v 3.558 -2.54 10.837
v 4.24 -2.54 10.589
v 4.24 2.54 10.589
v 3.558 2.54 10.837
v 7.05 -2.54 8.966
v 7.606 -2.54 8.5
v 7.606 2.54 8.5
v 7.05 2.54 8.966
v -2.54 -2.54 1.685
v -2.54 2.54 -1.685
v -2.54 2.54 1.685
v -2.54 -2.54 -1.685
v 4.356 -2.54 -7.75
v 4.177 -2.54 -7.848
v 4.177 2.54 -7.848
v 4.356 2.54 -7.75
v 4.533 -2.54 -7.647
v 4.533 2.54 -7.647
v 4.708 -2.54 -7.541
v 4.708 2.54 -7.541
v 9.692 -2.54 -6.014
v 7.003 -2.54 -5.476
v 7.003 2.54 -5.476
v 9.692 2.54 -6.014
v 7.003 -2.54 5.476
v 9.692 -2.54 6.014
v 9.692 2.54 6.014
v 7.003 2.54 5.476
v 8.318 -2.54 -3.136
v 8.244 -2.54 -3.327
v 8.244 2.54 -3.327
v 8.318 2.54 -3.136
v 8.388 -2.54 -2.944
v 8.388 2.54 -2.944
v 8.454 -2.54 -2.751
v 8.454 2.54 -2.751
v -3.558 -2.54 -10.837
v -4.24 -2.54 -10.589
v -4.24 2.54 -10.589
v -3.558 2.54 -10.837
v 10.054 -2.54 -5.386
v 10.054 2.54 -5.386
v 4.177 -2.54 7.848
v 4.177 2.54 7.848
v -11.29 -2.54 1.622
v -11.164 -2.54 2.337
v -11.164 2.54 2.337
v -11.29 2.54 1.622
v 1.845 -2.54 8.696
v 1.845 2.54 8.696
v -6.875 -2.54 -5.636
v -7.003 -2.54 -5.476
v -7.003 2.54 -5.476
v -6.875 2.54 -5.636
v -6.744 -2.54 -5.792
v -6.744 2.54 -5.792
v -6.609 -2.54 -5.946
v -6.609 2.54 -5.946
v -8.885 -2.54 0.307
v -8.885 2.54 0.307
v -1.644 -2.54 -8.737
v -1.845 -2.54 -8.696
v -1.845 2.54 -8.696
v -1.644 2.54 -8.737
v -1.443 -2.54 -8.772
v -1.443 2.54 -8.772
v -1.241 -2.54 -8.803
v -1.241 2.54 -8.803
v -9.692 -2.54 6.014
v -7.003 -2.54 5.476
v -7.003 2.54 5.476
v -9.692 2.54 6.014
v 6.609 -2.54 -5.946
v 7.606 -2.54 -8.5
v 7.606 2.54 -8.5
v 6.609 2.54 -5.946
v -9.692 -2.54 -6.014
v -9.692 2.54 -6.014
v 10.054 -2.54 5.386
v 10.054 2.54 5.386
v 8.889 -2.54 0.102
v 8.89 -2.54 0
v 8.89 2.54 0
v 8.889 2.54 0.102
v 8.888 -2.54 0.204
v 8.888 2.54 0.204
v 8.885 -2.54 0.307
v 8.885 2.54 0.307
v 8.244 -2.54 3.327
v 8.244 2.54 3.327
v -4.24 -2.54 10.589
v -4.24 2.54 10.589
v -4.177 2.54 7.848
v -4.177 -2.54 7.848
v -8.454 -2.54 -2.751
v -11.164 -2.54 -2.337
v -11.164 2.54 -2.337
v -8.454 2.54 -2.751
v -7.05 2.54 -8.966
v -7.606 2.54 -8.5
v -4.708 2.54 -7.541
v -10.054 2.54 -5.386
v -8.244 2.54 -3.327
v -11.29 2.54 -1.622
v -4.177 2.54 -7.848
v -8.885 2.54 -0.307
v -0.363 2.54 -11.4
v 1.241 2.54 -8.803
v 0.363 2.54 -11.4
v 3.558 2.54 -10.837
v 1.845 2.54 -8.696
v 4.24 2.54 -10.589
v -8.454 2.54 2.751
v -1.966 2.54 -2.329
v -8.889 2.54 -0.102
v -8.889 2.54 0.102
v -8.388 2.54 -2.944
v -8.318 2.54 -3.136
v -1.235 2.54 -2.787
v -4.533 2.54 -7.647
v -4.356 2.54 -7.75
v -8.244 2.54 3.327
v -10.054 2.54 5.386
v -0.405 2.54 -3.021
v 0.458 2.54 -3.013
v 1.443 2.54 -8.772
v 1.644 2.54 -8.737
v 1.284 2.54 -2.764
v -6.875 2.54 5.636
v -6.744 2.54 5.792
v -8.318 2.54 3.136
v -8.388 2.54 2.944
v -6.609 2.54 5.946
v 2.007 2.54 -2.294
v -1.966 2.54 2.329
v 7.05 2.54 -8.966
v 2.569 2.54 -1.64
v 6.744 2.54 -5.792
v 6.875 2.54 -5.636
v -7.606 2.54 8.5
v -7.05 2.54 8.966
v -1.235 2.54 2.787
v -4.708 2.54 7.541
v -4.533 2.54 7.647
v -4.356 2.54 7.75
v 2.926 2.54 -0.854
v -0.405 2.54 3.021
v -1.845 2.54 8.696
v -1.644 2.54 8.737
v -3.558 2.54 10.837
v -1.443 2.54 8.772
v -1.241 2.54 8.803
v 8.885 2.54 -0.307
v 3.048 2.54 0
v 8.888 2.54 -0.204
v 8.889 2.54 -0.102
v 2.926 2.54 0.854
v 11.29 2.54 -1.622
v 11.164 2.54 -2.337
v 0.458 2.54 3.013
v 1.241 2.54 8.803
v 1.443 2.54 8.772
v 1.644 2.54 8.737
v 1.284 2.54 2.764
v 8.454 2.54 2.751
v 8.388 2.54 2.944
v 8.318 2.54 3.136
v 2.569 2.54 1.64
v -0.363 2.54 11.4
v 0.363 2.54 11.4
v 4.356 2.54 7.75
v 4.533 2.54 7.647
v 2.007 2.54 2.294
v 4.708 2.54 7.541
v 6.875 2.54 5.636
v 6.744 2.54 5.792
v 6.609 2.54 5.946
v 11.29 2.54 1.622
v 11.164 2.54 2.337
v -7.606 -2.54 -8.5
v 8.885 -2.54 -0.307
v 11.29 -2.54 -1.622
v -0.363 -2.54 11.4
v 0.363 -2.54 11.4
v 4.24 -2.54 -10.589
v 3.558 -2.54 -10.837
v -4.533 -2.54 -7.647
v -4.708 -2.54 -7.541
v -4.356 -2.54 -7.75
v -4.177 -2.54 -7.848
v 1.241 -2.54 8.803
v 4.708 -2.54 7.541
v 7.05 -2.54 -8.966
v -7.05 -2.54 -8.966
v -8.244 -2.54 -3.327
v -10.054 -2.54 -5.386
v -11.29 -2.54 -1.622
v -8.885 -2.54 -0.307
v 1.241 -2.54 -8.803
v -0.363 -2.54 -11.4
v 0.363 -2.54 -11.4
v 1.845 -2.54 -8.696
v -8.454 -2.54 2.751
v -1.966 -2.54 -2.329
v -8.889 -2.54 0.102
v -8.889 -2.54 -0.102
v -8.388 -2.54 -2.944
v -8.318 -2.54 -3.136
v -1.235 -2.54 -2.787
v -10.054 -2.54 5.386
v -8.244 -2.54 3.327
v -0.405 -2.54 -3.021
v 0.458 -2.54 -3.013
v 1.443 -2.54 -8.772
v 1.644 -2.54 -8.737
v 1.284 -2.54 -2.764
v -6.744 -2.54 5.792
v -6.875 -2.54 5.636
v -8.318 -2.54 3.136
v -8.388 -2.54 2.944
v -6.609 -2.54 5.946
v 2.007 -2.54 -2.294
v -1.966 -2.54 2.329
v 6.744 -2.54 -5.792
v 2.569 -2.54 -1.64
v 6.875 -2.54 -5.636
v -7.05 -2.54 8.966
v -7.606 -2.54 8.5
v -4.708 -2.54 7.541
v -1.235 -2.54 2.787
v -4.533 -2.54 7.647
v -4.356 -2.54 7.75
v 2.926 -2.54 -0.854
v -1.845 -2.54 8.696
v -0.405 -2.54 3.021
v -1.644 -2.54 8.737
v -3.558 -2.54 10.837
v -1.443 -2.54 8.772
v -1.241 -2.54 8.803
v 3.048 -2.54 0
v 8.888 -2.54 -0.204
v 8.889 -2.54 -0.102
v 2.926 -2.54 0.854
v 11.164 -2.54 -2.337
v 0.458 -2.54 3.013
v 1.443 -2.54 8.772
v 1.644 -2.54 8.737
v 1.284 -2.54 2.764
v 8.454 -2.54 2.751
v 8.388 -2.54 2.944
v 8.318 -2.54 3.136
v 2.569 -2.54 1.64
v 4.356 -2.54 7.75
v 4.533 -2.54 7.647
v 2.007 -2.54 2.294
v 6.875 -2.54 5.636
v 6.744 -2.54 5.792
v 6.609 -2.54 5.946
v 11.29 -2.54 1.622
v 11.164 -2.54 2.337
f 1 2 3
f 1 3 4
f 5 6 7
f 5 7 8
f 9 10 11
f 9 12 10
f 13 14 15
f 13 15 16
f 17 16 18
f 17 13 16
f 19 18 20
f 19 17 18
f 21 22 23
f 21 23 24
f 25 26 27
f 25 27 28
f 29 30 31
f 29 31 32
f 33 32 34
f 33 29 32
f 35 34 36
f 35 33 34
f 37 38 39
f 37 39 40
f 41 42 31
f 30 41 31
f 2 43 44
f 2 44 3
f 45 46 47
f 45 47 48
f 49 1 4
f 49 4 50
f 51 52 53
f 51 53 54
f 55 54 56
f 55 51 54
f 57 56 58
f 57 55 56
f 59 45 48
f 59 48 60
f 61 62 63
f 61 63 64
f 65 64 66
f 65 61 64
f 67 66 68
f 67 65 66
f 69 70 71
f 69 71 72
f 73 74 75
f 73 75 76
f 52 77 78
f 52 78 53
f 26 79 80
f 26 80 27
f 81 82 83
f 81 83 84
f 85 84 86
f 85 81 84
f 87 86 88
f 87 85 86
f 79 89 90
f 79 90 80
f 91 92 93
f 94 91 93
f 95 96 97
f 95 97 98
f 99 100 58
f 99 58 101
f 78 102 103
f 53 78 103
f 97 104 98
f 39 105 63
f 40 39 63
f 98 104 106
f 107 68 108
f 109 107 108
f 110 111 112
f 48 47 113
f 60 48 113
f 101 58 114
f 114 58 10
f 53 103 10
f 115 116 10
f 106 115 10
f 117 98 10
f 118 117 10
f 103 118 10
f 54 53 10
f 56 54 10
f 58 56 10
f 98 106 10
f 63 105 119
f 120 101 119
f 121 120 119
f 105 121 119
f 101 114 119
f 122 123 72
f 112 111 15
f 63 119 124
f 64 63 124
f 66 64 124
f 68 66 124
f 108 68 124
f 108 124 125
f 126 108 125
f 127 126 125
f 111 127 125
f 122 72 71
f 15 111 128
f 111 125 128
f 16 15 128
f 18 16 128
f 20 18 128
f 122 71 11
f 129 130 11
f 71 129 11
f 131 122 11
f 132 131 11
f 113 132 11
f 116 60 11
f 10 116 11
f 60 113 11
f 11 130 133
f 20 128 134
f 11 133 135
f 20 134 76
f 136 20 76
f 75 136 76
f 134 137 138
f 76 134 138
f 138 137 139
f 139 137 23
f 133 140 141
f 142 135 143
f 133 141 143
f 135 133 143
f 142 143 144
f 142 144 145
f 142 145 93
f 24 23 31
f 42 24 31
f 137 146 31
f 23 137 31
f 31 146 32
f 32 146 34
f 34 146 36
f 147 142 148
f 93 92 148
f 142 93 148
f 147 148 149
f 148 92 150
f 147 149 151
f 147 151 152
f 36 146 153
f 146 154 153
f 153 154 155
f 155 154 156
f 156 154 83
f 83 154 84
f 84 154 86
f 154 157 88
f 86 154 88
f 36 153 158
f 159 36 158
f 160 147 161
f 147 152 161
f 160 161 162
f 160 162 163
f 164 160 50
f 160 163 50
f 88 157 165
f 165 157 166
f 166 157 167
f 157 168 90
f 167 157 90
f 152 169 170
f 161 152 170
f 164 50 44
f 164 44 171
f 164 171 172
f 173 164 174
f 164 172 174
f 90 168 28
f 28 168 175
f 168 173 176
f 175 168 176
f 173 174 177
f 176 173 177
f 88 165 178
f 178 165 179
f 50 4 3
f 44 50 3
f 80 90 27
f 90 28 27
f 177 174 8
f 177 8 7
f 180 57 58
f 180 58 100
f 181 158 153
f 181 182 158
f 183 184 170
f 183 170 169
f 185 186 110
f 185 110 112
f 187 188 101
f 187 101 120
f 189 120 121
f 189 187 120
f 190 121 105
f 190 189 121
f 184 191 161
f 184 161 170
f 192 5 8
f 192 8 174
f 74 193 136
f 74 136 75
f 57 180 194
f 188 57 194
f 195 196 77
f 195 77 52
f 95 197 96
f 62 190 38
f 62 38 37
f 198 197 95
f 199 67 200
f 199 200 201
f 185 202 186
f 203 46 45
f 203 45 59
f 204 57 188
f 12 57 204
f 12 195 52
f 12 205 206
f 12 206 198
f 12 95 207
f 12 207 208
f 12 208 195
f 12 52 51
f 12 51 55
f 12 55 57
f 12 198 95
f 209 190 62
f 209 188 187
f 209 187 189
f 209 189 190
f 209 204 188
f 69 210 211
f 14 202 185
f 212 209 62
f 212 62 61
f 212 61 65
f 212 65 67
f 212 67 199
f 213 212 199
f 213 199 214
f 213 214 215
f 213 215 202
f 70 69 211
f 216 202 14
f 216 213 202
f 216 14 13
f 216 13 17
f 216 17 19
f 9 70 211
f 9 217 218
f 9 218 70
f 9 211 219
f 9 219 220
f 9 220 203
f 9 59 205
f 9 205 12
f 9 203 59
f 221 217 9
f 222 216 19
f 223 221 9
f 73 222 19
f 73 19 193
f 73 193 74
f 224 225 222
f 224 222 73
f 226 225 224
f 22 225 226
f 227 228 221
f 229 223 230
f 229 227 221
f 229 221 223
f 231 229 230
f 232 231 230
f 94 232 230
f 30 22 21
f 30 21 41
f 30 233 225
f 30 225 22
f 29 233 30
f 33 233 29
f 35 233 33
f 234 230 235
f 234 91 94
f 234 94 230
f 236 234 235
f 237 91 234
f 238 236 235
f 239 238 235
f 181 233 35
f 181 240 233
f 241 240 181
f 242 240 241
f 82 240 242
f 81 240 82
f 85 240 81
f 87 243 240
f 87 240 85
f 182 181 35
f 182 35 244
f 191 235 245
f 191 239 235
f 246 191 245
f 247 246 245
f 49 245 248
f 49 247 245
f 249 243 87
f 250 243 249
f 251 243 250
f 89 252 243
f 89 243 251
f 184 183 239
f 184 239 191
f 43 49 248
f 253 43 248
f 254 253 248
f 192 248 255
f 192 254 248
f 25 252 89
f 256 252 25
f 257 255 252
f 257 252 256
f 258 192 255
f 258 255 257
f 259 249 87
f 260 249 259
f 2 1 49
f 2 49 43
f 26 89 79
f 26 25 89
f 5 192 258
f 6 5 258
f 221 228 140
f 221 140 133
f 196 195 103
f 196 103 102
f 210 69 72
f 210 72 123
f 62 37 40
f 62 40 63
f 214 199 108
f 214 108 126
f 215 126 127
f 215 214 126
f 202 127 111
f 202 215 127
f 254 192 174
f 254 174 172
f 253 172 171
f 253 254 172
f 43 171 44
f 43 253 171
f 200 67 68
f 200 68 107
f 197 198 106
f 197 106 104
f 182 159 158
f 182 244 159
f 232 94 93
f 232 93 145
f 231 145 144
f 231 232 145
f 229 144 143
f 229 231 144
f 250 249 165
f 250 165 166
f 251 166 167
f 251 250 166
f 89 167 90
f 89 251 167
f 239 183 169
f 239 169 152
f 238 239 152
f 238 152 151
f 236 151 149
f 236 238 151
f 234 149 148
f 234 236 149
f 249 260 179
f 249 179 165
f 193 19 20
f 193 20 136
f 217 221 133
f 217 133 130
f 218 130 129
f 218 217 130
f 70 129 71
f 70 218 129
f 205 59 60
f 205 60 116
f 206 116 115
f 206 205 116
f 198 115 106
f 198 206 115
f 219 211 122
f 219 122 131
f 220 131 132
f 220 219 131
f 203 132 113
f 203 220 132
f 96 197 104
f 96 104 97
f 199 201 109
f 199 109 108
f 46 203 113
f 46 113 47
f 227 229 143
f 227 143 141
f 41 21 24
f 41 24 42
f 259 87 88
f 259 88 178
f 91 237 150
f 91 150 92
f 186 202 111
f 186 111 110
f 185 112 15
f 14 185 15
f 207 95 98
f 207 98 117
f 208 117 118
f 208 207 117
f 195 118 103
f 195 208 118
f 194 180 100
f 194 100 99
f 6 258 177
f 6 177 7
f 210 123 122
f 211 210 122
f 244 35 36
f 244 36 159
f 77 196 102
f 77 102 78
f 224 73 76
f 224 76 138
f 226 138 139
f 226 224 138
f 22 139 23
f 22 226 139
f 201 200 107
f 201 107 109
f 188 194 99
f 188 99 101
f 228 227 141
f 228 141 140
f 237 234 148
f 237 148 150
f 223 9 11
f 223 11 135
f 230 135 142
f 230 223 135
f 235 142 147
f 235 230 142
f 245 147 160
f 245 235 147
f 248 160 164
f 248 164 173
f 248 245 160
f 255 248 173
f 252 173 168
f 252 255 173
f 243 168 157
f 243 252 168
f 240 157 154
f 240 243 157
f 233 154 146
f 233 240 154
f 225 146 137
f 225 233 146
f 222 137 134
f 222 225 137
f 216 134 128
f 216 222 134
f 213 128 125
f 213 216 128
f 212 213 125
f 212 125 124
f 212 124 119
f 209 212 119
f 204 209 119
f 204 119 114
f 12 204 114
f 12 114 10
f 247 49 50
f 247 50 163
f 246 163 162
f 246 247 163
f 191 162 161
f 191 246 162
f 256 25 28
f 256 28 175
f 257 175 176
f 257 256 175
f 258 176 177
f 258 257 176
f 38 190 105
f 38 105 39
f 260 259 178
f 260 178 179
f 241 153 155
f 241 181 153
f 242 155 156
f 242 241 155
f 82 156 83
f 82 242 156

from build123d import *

# Parameters (mm, degrees)
F1_DEPTH = 2.54


with BuildPart() as f1:
    # F0 (on Front) → F1 (new body, symmetric)
    with BuildSketch(Plane.XZ):
        with BuildLine():
            ThreePointArc((8.884708, -0.306712), (8.888677, -0.153379), (8.89, 0))
            ThreePointArc((8.89, 0), (8.888677, 0.153379), (8.884708, 0.306712))
            ThreePointArc((8.884708, 0.306712), (8.754941, 1.543732), (8.453796, 2.750534))
            ThreePointArc((8.453796, 2.750534), (8.353867, 3.040559), (8.243992, 3.326964))
            ThreePointArc((8.243992, 3.326964), (7.698966, 4.445), (7.003232, 5.476025))
            ThreePointArc((7.003232, 5.476025), (6.810135, 5.714382), (6.60893, 5.945935))
            ThreePointArc((6.60893, 5.945935), (5.714382, 6.810135), (4.707974, 7.541026))
            ThreePointArc((4.707974, 7.541026), (4.445, 7.698966), (4.176733, 7.847739))
            ThreePointArc((4.176733, 7.847739), (3.040559, 8.353867), (1.844866, 8.696469))
            ThreePointArc((1.844866, 8.696469), (1.543732, 8.754941), (1.240761, 8.802989))
            ThreePointArc((1.240761, 8.802989), (0, 8.89), (-1.240761, 8.802989))
            ThreePointArc((-1.240761, 8.802989), (-1.543732, 8.754941), (-1.844866, 8.696469))
            ThreePointArc((-1.844866, 8.696469), (-3.040559, 8.353867), (-4.176733, 7.847739))
            ThreePointArc((-4.176733, 7.847739), (-4.445, 7.698966), (-4.707974, 7.541026))
            ThreePointArc((-4.707974, 7.541026), (-5.714382, 6.810135), (-6.60893, 5.945935))
            ThreePointArc((-6.60893, 5.945935), (-6.810135, 5.714382), (-7.003232, 5.476025))
            ThreePointArc((-7.003232, 5.476025), (-7.698966, 4.445), (-8.243992, 3.326964))
            ThreePointArc((-8.243992, 3.326964), (-8.353867, 3.040559), (-8.453796, 2.750534))
            ThreePointArc((-8.453796, 2.750534), (-8.754941, 1.543732), (-8.884708, 0.306712))
            ThreePointArc((-8.884708, 0.306712), (-8.89, 0), (-8.884708, -0.306712))
            ThreePointArc((-8.884708, -0.306712), (-8.754941, -1.543732), (-8.453796, -2.750534))
            ThreePointArc((-8.453796, -2.750534), (-8.353867, -3.040559), (-8.243992, -3.326964))
            ThreePointArc((-8.243992, -3.326964), (-7.698966, -4.445), (-7.003232, -5.476025))
            ThreePointArc((-7.003232, -5.476025), (-6.810135, -5.714382), (-6.60893, -5.945935))
            ThreePointArc((-6.60893, -5.945935), (-5.714382, -6.810135), (-4.707974, -7.541026))
            ThreePointArc((-4.707974, -7.541026), (-4.445, -7.698966), (-4.176733, -7.847739))
            ThreePointArc((-4.176733, -7.847739), (-3.040559, -8.353867), (-1.844866, -8.696469))
            ThreePointArc((-1.844866, -8.696469), (-1.543732, -8.754941), (-1.240761, -8.802989))
            ThreePointArc((-1.240761, -8.802989), (0, -8.89), (1.240761, -8.802989))
            ThreePointArc((1.240761, -8.802989), (1.543732, -8.754941), (1.844866, -8.696469))
            ThreePointArc((1.844866, -8.696469), (3.040559, -8.353867), (4.176733, -7.847739))
            ThreePointArc((4.176733, -7.847739), (4.445, -7.698966), (4.707974, -7.541026))
            ThreePointArc((4.707974, -7.541026), (5.714382, -6.810135), (6.60893, -5.945935))
            ThreePointArc((6.60893, -5.945935), (6.810135, -5.714382), (7.003232, -5.476025))
            ThreePointArc((7.003232, -5.476025), (7.698966, -4.445), (8.243992, -3.326964))
            ThreePointArc((8.243992, -3.326964), (8.353867, -3.040559), (8.453796, -2.750534))
            ThreePointArc((8.453796, -2.750534), (8.754941, -1.543732), (8.884708, -0.306712))
        make_face()
        with BuildLine():
            ThreePointArc((-2.54, 1.684845), (3.048, 0), (-2.54, -1.684845))
            Line((-2.54, -1.684845), (-2.54, 1.684845))
        make_face(mode=Mode.SUBTRACT)
        with BuildLine():
            ThreePointArc((1.844866, 8.696469), (3.040559, 8.353867), (4.176733, 7.847739))
            Line((4.176733, 7.847739), (4.239865, 10.588624))
            Line((4.239865, 10.588624), (3.558311, 10.83669))
            Line((3.558311, 10.83669), (1.844866, 8.696469))
        make_face()
        with BuildLine():
            ThreePointArc((-1.240761, 8.802989), (0, 8.89), (1.240761, 8.802989))
            Line((1.240761, 8.802989), (0.362647, 11.400172))
            Line((0.362647, 11.400172), (-0.362647, 11.400172))
            Line((-0.362647, 11.400172), (-1.240761, 8.802989))
        make_face()
        with BuildLine():
            ThreePointArc((-4.176733, 7.847739), (-3.040559, 8.353867), (-1.844866, 8.696469))
            Line((-1.844866, 8.696469), (-3.558311, 10.83669))
            Line((-3.558311, 10.83669), (-4.239865, 10.588624))
            Line((-4.239865, 10.588624), (-4.176733, 7.847739))
        make_face()
        with BuildLine():
            ThreePointArc((-6.60893, 5.945935), (-5.714382, 6.810135), (-4.707974, 7.541026))
            Line((-4.707974, 7.541026), (-7.050085, 8.966143))
            Line((-7.050085, 8.966143), (-7.605693, 8.499933))
            Line((-7.605693, 8.499933), (-6.60893, 5.945935))
        make_face()
        with BuildLine():
            ThreePointArc((-8.243992, 3.326964), (-7.698966, 4.445), (-7.003232, 5.476025))
            Line((-7.003232, 5.476025), (-9.691514, 6.014148))
            Line((-9.691514, 6.014148), (-10.054162, 5.386024))
            Line((-10.054162, 5.386024), (-8.243992, 3.326964))
        make_face()
        with BuildLine():
            ThreePointArc((-8.884708, 0.306712), (-8.754941, 1.543732), (-8.453796, 2.750534))
            Line((-8.453796, 2.750534), (-11.164004, 2.336757))
            Line((-11.164004, 2.336757), (-11.28995, 1.622481))
            Line((-11.28995, 1.622481), (-8.884708, 0.306712))
        make_face()
        with BuildLine():
            Line((-11.164004, -2.336757), (-8.453796, -2.750534))
            ThreePointArc((-8.453796, -2.750534), (-8.754941, -1.543732), (-8.884708, -0.306712))
            Line((-8.884708, -0.306712), (-11.28995, -1.622481))
            Line((-11.28995, -1.622481), (-11.164004, -2.336757))
        make_face()
        with BuildLine():
            Line((-9.691514, -6.014148), (-7.003232, -5.476025))
            ThreePointArc((-7.003232, -5.476025), (-7.698966, -4.445), (-8.243992, -3.326964))
            Line((-8.243992, -3.326964), (-10.054162, -5.386024))
            Line((-10.054162, -5.386024), (-9.691514, -6.014148))
        make_face()
        with BuildLine():
            Line((-7.050085, -8.966143), (-4.707974, -7.541026))
            ThreePointArc((-4.707974, -7.541026), (-5.714382, -6.810135), (-6.60893, -5.945935))
            Line((-6.60893, -5.945935), (-7.605693, -8.499933))
            Line((-7.605693, -8.499933), (-7.050085, -8.966143))
        make_face()
        with BuildLine():
            Line((-3.558311, -10.83669), (-1.844866, -8.696469))
            ThreePointArc((-1.844866, -8.696469), (-3.040559, -8.353867), (-4.176733, -7.847739))
            Line((-4.176733, -7.847739), (-4.239865, -10.588624))
            Line((-4.239865, -10.588624), (-3.558311, -10.83669))
        make_face()
        with BuildLine():
            Line((4.239865, -10.588624), (4.176733, -7.847739))
            ThreePointArc((4.176733, -7.847739), (3.040559, -8.353867), (1.844866, -8.696469))
            Line((1.844866, -8.696469), (3.558311, -10.83669))
            Line((3.558311, -10.83669), (4.239865, -10.588624))
        make_face()
        with BuildLine():
            Line((7.605693, -8.499933), (6.60893, -5.945935))
            ThreePointArc((6.60893, -5.945935), (5.714382, -6.810135), (4.707974, -7.541026))
            Line((4.707974, -7.541026), (7.050085, -8.966143))
            Line((7.050085, -8.966143), (7.605693, -8.499933))
        make_face()
        with BuildLine():
            Line((10.054162, -5.386024), (8.243992, -3.326964))
            ThreePointArc((8.243992, -3.326964), (7.698966, -4.445), (7.003232, -5.476025))
            Line((7.003232, -5.476025), (9.691514, -6.014148))
            Line((9.691514, -6.014148), (10.054162, -5.386024))
        make_face()
        with BuildLine():
            Line((11.28995, -1.622481), (8.884708, -0.306712))
            ThreePointArc((8.884708, -0.306712), (8.754941, -1.543732), (8.453796, -2.750534))
            Line((8.453796, -2.750534), (11.164004, -2.336757))
            Line((11.164004, -2.336757), (11.28995, -1.622481))
        make_face()
        with BuildLine():
            ThreePointArc((7.003232, 5.476025), (7.698966, 4.445), (8.243992, 3.326964))
            Line((8.243992, 3.326964), (10.054162, 5.386024))
            Line((10.054162, 5.386024), (9.691514, 6.014148))
            Line((9.691514, 6.014148), (7.003232, 5.476025))
        make_face()
        with BuildLine():
            ThreePointArc((4.707974, 7.541026), (5.714382, 6.810135), (6.60893, 5.945935))
            Line((6.60893, 5.945935), (7.605693, 8.499933))
            Line((7.605693, 8.499933), (7.050085, 8.966143))
            Line((7.050085, 8.966143), (4.707974, 7.541026))
        make_face()
        with BuildLine():
            ThreePointArc((8.453796, 2.750534), (8.754941, 1.543732), (8.884708, 0.306712))
            Line((8.884708, 0.306712), (11.28995, 1.622481))
            Line((11.28995, 1.622481), (11.164004, 2.336757))
            Line((11.164004, 2.336757), (8.453796, 2.750534))
        make_face()
        with BuildLine():
            Line((0.362647, -11.400172), (1.240761, -8.802989))
            ThreePointArc((1.240761, -8.802989), (0, -8.89), (-1.240761, -8.802989))
            Line((-1.240761, -8.802989), (-0.362647, -11.400172))
            Line((-0.362647, -11.400172), (0.362647, -11.400172))
        make_face()
    extrude(amount=F1_DEPTH, both=True)


solid = f1.part
